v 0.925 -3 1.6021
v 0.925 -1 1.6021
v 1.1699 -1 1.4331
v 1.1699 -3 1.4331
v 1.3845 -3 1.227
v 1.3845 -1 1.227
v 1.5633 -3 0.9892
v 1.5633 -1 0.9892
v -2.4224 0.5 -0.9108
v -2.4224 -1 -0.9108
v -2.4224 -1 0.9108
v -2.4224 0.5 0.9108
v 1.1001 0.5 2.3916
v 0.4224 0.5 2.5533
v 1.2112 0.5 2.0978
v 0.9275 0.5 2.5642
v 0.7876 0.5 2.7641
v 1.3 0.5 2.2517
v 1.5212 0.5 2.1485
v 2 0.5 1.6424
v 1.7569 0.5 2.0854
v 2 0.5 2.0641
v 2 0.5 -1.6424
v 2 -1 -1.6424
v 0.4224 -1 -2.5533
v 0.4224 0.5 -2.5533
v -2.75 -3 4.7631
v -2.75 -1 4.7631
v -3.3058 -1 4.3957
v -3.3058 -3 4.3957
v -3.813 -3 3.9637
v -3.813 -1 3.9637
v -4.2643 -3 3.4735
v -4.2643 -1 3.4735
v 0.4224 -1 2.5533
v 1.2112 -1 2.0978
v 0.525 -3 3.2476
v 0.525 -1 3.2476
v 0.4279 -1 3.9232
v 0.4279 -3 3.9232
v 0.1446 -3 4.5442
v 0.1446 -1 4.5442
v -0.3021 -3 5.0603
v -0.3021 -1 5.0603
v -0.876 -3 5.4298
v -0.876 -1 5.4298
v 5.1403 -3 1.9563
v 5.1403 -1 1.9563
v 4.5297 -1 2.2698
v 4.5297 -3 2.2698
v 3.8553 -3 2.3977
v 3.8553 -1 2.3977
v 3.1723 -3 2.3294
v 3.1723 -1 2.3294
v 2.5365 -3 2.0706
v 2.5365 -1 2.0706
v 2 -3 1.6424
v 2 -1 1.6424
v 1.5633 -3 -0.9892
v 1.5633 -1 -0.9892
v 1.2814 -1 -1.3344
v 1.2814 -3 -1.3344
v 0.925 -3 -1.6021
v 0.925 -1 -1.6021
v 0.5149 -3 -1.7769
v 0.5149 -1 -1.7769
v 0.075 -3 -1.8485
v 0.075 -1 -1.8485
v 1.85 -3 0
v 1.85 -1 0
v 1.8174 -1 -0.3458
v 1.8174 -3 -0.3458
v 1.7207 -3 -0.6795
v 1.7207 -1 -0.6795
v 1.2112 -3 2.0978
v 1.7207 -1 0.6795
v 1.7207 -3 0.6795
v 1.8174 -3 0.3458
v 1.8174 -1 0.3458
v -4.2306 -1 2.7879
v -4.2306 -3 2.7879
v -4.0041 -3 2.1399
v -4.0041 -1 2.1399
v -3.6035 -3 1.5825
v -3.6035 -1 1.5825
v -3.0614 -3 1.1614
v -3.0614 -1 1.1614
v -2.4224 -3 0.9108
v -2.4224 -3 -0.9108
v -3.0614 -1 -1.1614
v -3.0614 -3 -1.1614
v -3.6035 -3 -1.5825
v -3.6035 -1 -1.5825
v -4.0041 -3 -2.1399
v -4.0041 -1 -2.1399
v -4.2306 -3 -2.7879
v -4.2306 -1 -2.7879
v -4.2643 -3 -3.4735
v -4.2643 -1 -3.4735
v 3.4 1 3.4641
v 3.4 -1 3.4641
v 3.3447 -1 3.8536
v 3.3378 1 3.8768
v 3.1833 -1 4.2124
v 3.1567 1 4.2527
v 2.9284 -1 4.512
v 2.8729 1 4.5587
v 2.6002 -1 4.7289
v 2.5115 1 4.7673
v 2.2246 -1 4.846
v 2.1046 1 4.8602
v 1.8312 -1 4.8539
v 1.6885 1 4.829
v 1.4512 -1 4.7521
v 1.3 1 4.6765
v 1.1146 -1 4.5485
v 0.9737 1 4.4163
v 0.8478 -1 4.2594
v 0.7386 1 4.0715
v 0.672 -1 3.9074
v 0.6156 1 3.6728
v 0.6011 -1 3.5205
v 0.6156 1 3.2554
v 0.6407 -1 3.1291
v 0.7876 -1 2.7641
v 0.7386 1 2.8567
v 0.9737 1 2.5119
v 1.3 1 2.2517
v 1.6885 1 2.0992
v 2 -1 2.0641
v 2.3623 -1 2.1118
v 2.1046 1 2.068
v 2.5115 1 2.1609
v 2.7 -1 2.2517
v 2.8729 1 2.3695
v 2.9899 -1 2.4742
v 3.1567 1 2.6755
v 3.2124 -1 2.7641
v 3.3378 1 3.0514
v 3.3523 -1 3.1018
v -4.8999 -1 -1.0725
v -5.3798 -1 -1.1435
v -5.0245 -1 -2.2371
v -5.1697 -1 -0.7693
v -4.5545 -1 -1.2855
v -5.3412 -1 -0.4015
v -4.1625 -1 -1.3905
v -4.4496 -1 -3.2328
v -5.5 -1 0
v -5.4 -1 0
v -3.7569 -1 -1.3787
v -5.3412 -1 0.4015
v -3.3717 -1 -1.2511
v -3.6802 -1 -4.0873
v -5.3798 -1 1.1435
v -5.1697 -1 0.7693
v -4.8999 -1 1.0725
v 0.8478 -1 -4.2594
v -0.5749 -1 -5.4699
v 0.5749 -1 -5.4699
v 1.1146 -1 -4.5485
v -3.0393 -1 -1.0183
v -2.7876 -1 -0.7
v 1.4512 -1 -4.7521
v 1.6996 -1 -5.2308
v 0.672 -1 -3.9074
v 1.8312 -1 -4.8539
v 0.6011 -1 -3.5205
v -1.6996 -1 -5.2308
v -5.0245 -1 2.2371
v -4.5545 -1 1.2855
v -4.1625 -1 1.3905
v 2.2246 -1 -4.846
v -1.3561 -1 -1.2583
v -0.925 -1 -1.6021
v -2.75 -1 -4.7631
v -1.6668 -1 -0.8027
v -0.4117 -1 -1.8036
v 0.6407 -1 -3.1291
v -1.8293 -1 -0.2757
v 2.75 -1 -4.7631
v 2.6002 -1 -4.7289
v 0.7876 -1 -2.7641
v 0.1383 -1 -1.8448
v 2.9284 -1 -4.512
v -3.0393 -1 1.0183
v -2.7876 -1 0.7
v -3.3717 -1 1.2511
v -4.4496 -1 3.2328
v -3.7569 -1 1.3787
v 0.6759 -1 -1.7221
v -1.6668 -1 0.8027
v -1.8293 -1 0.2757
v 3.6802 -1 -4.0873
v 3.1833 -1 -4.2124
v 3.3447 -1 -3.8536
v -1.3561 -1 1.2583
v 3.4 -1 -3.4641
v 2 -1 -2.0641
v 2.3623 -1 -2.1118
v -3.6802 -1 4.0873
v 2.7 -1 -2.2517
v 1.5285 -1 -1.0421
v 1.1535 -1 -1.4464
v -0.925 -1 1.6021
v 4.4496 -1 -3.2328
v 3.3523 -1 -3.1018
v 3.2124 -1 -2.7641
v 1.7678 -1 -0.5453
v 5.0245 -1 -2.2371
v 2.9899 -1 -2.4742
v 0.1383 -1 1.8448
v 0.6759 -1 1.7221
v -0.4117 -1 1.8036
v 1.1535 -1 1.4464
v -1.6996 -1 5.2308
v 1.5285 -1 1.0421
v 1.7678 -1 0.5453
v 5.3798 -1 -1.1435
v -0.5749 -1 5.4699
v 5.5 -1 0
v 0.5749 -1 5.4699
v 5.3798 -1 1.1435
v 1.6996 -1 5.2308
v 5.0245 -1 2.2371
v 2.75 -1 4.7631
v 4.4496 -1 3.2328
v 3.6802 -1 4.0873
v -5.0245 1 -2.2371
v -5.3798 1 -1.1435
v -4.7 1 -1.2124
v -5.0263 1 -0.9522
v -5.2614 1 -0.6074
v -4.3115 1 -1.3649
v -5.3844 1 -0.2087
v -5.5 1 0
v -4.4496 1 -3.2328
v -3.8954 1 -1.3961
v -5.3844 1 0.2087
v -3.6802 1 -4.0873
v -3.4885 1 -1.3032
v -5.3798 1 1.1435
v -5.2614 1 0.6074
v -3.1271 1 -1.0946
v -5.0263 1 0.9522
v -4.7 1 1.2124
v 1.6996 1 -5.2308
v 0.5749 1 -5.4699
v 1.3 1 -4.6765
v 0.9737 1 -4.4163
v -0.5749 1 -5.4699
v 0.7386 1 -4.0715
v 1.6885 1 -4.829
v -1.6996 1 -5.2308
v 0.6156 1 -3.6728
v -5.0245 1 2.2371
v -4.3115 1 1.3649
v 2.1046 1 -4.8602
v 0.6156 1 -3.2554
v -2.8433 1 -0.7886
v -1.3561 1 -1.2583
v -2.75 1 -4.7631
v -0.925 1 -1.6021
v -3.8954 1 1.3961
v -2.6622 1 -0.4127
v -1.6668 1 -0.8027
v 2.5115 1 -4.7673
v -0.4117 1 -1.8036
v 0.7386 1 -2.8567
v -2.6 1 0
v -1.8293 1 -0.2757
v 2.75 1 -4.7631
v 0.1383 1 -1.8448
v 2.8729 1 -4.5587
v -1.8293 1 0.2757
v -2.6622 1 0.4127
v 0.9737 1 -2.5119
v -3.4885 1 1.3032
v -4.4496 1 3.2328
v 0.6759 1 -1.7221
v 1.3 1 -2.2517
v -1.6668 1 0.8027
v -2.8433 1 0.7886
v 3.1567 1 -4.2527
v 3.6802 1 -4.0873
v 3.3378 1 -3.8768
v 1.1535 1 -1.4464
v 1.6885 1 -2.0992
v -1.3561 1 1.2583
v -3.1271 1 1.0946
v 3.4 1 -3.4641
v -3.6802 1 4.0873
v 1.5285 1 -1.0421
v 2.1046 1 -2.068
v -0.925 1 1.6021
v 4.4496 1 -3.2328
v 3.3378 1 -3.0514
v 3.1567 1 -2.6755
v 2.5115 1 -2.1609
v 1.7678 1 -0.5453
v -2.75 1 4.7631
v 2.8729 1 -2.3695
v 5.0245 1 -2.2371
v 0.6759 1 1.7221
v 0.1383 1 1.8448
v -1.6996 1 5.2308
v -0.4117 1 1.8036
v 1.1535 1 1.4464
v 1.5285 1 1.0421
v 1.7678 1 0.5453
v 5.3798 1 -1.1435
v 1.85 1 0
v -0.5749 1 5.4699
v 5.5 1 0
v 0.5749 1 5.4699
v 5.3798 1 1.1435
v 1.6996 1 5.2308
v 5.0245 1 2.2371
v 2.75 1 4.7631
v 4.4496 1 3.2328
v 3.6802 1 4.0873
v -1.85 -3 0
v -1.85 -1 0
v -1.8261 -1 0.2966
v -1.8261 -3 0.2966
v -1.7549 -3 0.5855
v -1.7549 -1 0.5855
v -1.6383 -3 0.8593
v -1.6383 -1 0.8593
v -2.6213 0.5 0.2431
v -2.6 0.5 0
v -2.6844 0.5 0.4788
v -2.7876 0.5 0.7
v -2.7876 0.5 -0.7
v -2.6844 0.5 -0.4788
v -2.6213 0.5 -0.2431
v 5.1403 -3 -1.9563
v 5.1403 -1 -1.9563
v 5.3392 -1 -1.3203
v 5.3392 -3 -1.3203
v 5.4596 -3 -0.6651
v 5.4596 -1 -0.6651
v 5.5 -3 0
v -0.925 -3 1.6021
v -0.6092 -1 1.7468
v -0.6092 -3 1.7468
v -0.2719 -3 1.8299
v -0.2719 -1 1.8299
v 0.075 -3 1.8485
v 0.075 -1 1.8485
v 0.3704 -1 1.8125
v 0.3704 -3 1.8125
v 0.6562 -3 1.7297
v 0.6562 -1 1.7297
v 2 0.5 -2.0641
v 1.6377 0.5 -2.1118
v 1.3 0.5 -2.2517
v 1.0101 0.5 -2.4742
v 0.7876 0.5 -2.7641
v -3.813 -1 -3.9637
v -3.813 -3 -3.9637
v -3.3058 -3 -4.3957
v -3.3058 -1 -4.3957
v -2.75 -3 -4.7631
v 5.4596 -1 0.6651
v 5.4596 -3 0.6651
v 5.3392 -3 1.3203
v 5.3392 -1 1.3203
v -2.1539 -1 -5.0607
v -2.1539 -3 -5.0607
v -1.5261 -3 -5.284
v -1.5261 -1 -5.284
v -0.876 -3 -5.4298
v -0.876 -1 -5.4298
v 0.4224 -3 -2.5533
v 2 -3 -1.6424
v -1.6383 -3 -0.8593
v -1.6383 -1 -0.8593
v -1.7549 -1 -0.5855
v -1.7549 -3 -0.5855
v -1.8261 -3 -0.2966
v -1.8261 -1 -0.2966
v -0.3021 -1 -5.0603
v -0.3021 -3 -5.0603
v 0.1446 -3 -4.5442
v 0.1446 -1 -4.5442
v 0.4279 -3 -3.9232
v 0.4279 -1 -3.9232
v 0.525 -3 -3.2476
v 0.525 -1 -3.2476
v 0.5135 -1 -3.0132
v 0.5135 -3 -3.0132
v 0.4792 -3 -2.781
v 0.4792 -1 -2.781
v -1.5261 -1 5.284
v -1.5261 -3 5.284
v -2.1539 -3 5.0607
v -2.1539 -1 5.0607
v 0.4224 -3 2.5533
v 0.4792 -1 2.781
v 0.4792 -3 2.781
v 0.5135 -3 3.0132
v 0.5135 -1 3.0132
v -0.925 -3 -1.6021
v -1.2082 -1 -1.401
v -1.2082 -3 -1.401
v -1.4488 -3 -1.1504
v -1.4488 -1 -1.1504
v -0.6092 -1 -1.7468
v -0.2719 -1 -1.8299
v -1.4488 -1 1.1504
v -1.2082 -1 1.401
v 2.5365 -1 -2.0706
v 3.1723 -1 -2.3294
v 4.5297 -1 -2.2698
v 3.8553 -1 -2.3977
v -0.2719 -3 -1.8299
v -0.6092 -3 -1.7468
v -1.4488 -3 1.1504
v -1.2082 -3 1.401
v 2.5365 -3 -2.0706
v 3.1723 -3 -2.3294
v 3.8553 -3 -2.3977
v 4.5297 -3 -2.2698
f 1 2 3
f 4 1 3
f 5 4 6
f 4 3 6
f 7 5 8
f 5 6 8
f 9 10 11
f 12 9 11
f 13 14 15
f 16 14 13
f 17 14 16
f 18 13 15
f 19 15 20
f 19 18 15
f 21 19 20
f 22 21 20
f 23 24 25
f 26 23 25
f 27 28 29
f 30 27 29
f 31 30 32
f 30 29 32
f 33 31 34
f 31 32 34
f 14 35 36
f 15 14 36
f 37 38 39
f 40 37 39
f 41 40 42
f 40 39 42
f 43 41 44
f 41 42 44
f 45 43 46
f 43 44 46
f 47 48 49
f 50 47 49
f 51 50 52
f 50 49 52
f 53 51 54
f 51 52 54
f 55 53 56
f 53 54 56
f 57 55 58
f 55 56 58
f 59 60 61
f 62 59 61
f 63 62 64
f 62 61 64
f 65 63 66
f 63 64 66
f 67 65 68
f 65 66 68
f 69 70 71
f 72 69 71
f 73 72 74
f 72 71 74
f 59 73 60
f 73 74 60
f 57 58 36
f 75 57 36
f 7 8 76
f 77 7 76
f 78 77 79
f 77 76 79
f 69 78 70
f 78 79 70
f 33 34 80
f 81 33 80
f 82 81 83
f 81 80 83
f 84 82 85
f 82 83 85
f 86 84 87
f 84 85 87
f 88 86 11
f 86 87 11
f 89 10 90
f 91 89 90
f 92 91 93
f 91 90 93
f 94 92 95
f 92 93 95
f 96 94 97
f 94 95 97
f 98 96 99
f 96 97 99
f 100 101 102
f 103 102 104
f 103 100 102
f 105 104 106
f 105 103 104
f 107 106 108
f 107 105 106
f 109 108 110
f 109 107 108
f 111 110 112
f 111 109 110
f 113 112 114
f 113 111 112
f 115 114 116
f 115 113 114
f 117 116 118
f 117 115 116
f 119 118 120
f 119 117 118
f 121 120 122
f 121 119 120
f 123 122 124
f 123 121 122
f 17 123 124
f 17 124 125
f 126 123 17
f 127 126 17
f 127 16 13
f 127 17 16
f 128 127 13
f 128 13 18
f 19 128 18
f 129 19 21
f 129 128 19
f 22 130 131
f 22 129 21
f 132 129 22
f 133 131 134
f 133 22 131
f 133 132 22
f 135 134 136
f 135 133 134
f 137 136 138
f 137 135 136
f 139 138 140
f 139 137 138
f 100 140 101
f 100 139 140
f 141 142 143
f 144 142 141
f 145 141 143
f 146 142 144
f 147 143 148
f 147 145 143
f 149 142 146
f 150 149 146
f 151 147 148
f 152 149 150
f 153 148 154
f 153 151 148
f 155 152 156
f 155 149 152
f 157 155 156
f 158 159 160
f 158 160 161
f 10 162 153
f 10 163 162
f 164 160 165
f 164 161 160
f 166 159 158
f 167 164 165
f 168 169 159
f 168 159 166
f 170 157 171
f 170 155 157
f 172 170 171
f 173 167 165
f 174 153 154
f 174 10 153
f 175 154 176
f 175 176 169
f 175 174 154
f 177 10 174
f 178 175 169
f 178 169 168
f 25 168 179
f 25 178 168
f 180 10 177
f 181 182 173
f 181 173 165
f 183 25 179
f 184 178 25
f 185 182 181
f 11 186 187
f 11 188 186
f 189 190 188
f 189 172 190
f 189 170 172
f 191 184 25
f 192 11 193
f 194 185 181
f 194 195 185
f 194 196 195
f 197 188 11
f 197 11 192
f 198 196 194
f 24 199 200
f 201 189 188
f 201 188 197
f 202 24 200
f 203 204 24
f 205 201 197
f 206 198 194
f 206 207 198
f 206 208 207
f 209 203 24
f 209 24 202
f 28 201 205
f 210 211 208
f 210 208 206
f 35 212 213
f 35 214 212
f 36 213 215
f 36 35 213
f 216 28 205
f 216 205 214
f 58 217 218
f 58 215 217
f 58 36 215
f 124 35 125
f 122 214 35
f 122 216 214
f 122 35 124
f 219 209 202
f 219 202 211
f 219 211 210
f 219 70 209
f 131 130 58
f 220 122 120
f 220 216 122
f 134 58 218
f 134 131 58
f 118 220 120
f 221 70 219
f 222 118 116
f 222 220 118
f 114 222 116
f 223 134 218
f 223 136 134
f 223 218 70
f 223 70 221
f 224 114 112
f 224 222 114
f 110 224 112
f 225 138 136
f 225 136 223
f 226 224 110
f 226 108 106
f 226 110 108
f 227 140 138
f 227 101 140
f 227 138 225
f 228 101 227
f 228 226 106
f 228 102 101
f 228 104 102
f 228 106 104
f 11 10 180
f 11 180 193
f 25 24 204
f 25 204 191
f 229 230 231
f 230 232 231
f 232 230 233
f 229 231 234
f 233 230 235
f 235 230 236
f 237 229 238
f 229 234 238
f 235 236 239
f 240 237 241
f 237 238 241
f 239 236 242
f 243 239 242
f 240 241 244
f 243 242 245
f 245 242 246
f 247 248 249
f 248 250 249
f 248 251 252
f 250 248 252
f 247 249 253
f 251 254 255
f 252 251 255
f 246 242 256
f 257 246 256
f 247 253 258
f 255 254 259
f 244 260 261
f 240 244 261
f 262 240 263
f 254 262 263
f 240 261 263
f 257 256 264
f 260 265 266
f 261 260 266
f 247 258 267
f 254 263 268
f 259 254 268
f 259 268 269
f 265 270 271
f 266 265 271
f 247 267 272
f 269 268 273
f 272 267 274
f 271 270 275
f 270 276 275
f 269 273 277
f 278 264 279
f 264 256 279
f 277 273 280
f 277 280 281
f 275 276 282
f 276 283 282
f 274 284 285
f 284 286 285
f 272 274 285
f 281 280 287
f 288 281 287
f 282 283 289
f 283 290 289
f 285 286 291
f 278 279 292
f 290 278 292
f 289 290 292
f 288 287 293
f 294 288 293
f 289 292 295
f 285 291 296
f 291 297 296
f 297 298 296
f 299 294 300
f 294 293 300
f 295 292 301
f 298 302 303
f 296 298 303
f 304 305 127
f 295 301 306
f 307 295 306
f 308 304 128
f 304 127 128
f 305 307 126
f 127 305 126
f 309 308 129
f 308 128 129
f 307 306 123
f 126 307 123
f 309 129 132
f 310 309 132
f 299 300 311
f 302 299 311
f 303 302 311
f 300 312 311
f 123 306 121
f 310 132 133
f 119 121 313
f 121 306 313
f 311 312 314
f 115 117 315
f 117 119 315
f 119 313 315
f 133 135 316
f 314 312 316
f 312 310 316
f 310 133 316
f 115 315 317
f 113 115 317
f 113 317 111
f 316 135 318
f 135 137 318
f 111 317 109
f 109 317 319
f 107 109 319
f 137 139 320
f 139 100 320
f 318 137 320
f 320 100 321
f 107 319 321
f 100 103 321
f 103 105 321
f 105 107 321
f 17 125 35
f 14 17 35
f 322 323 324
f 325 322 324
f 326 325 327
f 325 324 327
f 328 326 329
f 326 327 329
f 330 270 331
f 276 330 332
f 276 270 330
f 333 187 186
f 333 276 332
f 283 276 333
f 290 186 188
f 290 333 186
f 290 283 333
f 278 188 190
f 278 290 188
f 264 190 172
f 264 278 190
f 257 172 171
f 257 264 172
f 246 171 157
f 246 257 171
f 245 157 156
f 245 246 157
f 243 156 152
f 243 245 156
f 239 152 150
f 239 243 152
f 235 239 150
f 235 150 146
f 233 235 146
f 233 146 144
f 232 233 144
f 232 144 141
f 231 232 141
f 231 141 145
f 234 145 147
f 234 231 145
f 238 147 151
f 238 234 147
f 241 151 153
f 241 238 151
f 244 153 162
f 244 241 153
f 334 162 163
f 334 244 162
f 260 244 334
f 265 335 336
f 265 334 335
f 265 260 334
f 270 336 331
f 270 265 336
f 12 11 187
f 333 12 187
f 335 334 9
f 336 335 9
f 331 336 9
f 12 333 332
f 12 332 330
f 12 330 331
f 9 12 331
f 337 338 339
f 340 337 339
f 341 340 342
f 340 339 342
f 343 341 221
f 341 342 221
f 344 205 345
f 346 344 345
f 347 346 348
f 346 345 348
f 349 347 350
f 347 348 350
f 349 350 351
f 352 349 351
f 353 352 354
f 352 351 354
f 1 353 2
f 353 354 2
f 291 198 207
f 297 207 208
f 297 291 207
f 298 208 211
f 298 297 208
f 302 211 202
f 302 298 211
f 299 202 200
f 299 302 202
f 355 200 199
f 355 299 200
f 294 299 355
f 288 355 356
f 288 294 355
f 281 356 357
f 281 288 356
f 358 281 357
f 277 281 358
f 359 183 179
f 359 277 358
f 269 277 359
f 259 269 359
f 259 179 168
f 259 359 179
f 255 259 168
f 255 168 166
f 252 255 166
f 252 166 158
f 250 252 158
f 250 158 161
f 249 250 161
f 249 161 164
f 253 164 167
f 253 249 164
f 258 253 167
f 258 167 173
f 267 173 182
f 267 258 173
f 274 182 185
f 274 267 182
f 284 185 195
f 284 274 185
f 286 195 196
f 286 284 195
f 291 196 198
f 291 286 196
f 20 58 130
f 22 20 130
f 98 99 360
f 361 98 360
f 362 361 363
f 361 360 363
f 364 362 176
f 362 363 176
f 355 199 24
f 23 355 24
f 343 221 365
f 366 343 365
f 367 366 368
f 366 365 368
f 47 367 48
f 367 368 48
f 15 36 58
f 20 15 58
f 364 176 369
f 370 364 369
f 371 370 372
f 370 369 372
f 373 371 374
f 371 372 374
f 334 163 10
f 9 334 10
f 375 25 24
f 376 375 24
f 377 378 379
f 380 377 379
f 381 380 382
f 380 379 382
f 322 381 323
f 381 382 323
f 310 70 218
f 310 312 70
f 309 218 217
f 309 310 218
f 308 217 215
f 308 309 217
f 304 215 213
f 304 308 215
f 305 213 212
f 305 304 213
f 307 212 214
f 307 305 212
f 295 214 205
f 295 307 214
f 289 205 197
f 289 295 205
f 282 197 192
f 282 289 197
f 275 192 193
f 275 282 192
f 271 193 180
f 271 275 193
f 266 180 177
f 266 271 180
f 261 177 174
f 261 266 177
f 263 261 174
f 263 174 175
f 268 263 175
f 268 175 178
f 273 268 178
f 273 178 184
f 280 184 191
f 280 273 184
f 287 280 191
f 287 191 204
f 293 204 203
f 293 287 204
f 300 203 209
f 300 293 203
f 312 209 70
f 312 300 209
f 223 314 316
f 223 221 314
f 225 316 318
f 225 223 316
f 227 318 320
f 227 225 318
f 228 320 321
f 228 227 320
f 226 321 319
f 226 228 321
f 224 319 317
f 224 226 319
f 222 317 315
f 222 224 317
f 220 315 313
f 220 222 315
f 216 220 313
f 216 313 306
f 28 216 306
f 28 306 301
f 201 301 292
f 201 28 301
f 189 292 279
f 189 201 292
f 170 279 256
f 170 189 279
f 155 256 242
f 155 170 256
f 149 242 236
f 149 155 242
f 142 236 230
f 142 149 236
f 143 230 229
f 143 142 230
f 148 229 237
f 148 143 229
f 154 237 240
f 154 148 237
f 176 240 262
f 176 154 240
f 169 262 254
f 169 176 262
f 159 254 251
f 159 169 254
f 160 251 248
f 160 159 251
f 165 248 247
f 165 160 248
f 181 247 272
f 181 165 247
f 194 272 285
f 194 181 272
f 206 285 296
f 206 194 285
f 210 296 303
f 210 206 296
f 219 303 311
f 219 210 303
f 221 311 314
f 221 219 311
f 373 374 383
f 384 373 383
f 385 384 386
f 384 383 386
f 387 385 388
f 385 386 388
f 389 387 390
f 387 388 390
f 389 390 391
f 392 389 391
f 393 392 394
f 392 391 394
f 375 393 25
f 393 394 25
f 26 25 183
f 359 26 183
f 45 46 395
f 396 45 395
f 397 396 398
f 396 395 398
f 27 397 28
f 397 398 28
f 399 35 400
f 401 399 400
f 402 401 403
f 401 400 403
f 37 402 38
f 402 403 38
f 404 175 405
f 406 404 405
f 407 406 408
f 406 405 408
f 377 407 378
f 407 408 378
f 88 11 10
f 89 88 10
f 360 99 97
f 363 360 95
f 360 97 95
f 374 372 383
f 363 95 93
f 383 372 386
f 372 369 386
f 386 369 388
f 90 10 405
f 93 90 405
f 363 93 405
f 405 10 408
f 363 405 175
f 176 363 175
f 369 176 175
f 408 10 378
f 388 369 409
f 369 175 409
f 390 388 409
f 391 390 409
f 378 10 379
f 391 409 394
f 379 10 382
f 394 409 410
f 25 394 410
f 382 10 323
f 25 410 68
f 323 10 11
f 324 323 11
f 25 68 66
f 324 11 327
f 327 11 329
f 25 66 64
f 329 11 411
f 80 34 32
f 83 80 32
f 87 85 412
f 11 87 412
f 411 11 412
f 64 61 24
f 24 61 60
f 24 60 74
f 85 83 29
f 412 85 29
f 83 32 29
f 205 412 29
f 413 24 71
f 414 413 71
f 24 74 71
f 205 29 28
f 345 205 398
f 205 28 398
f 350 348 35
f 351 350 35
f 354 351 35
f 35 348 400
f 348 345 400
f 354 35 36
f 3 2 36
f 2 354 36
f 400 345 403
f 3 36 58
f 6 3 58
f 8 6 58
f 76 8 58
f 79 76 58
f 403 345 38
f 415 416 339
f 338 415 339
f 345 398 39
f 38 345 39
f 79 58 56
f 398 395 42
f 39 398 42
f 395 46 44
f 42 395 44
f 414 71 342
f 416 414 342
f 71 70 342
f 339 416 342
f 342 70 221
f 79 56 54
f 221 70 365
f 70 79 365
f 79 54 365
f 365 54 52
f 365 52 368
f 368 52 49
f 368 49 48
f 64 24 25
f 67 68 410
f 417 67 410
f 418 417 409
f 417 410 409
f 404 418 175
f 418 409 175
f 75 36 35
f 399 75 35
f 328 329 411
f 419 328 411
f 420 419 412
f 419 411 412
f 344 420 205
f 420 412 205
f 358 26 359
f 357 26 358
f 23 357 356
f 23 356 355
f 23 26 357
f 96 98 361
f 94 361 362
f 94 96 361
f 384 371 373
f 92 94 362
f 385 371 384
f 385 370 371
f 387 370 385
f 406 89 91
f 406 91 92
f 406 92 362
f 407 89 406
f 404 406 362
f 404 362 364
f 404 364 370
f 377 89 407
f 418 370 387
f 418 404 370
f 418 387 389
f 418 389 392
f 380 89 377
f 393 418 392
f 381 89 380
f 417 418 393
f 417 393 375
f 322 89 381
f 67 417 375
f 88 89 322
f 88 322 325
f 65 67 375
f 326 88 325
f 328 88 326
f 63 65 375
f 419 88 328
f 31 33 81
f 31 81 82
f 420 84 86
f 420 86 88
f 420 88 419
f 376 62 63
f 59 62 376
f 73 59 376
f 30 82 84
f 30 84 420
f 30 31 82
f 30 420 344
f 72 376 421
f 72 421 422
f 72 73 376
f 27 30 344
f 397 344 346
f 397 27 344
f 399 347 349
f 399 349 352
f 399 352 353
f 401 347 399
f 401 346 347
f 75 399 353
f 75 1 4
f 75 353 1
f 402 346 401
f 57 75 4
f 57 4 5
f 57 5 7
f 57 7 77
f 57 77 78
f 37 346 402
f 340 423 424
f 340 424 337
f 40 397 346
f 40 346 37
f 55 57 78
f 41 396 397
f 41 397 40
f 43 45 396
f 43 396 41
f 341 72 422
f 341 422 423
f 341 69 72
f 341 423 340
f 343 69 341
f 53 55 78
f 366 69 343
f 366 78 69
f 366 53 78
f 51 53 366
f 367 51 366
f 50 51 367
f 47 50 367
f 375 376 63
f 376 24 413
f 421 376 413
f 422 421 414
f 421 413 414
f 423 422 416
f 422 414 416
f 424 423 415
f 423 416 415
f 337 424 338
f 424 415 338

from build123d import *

# Parameters (mm, degrees)
F0_R     = 5.5
F0_R_2   = 1.4
F0_R_3   = 1.85
F1_DEPTH = 1
F3_DEPTH = 2
F4_DEPTH = 1.5


with BuildPart() as f1:
    # F0 (on Front) → F1 (new body, symmetric)
    with BuildSketch(Plane.XZ):
        Circle(F0_R)
        with Locations((2, -3.4641016151)):
            Circle(F0_R_2, mode=Mode.SUBTRACT)
        with Locations((-4, 0)):
            Circle(F0_R_2, mode=Mode.SUBTRACT)
        Circle(F0_R_3, mode=Mode.SUBTRACT)
        with Locations((2, 3.4641016151)):
            Circle(F0_R_2, mode=Mode.SUBTRACT)
    extrude(amount=F1_DEPTH, both=True)

    # F2 (on face) → F4 (cut)
    with BuildSketch(Plane.XZ.offset(1)):
        with BuildLine():
            Line((1.2111829933, 2.0978304817), (1.3, 2.2516660498))
            ThreePointArc((1.3, 2.2516660498), (1.0100505063, 2.4741521215), (0.7875644347, 2.7641016151))
            Line((0.7875644347, 2.7641016151), (0.4223659867, 2.5532541929))
            Line((0.4223659867, 2.5532541929), (1.2111829933, 2.0978304817))
        make_face()
        with BuildLine():
            ThreePointArc((2, 2.0641016151), (1.6376533369, 2.1118054583), (1.3, 2.2516660498))
            Line((1.3, 2.2516660498), (1.2111829933, 2.0978304817))
            Line((1.2111829933, 2.0978304817), (2, 1.6424067706))
            Line((2, 1.6424067706), (2, 2.0641016151))
        make_face()
        with BuildLine():
            Line((2, -2.0641016151), (2, -1.6424067706))
            Line((2, -1.6424067706), (0.4223659867, -2.5532541929))
            Line((0.4223659867, -2.5532541929), (0.7875644347, -2.7641016151))
            ThreePointArc((0.7875644347, -2.7641016151), (1.3, -2.2516660498), (2, -2.0641016151))
        make_face()
        with BuildLine():
            Line((-2.4223659867, -0.9108474223), (-2.4223659867, 0))
            Line((-2.4223659867, 0), (-2.6, 0))
            ThreePointArc((-2.6, 0), (-2.6477038432, -0.3623466631), (-2.7875644347, -0.7))
            Line((-2.7875644347, -0.7), (-2.4223659867, -0.9108474223))
        make_face()
        with BuildLine():
            Line((-2.4223659867, 0), (-2.4223659867, 0.9108474223))
            Line((-2.4223659867, 0.9108474223), (-2.7875644347, 0.7))
            ThreePointArc((-2.7875644347, 0.7), (-2.6477038432, 0.3623466631), (-2.6, 0))
            Line((-2.6, 0), (-2.4223659867, 0))
        make_face()
    extrude(amount=-F4_DEPTH, mode=Mode.SUBTRACT)


with BuildPart() as f3:
    # F2 (on face) → F3 (new body)
    with BuildSketch(Plane.XZ.offset(1)):
        with BuildLine():
            Line((-1, 1.7320508076), (0.4223659867, 2.5532541929))
            ThreePointArc((0.4223659867, 2.5532541929), (0.4992028523, 2.896652511), (0.525, 3.2475952642))
            ThreePointArc((0.525, 3.2475952642), (0.1446064838, 4.5442022404), (-0.8759913757, 5.4297918109))
            ThreePointArc((-0.8759913757, 5.4297918109), (-1.843382656, 5.1818857941), (-2.75, 4.7631397208))
            Line((-2.75, 4.7631397208), (-1, 1.7320508076))
        make_face()
        with BuildLine():
            Line((-2.4223659867, 0.9108474223), (-1, 1.7320508076))
            Line((-1, 1.7320508076), (-2.75, 4.7631397208))
            ThreePointArc((-2.75, 4.7631397208), (-3.5659534093, 4.1873591061), (-4.2643419577, 3.4735266903))
            ThreePointArc((-4.2643419577, 3.4735266903), (-3.823818782, 1.8468435536), (-2.4223659867, 0.9108474223))
        make_face()
        with BuildLine():
            ThreePointArc((5.1403333333, 1.9562651206), (3.5113228252, 2.3881024279), (2, 1.6424067706))
            Line((2, 1.6424067706), (2, 0))
            Line((2, 0), (5.5, 0))
            ThreePointArc((5.5, 0), (5.4093360652, 0.9945266881), (5.1403333333, 1.9562651206))
        make_face()
        with BuildLine():
            Line((5.5, 0), (2, 0))
            Line((2, 0), (2, -1.6424067706))
            ThreePointArc((2, -1.6424067706), (3.5113228252, -2.3881024279), (5.1403333333, -1.9562651206))
            ThreePointArc((5.1403333333, -1.9562651206), (5.4093360652, -0.9945266881), (5.5, 0))
        make_face()
        with BuildLine():
            ThreePointArc((0.525, -3.2475952642), (0.4992028523, -2.896652511), (0.4223659867, -2.5532541929))
            Line((0.4223659867, -2.5532541929), (-1, -1.7320508076))
            Line((-1, -1.7320508076), (-2.75, -4.7631397208))
            ThreePointArc((-2.75, -4.7631397208), (-1.843382656, -5.1818857941), (-0.8759913757, -5.4297918109))
            ThreePointArc((-0.8759913757, -5.4297918109), (0.1446064838, -4.5442022404), (0.525, -3.2475952642))
        make_face()
        with BuildLine():
            Line((-2.75, -4.7631397208), (-1, -1.7320508076))
            Line((-1, -1.7320508076), (-2.4223659867, -0.9108474223))
            ThreePointArc((-2.4223659867, -0.9108474223), (-3.823818782, -1.8468435536), (-4.2643419577, -3.4735266903))
            ThreePointArc((-4.2643419577, -3.4735266903), (-3.5659534093, -4.1873591061), (-2.75, -4.7631397208))
        make_face()
        with BuildLine():
            Line((0.925, 1.602146997), (1.2111829933, 2.0978304817))
            Line((1.2111829933, 2.0978304817), (0.4223659867, 2.5532541929))
            ThreePointArc((0.4223659867, 2.5532541929), (0.2777174855, 2.1865545357), (0.0749935149, 1.8484793677))
            ThreePointArc((0.0749935149, 1.8484793677), (0.5149433626, 1.7768886666), (0.925, 1.602146997))
        make_face()
        with BuildLine():
            Line((2, 1.6424067706), (1.2111829933, 2.0978304817))
            Line((1.2111829933, 2.0978304817), (0.925, 1.602146997))
            ThreePointArc((0.925, 1.602146997), (1.2813590436, 1.3343983668), (1.5633333333, 0.9891859729))
            ThreePointArc((1.5633333333, 0.9891859729), (1.7547530319, 1.3337876654), (2, 1.6424067706))
        make_face()
        with BuildLine():
            Line((0.4223659867, -2.5532541929), (2, -1.6424067706))
            ThreePointArc((2, -1.6424067706), (1.7547530319, -1.3337876654), (1.5633333333, -0.9891859729))
            ThreePointArc((1.5633333333, -0.9891859729), (0.925, -1.602146997), (0.0749935149, -1.8484793677))
            ThreePointArc((0.0749935149, -1.8484793677), (0.2777174855, -2.1865545357), (0.4223659867, -2.5532541929))
        make_face()
        with BuildLine():
            ThreePointArc((-1.6383268482, 0.8592933948), (-2.0324705174, 0.8527668703), (-2.4223659867, 0.9108474223))
            Line((-2.4223659867, 0.9108474223), (-2.4223659867, 0))
            Line((-2.4223659867, 0), (-1.85, 0))
            ThreePointArc((-1.85, 0), (-1.7963024062, 0.4424902998), (-1.6383268482, 0.8592933948))
        make_face()
        with BuildLine():
            ThreePointArc((-1.6383268482, -0.8592933948), (-1.7963024062, -0.4424902998), (-1.85, 0))
            Line((-1.85, 0), (-2.4223659867, 0))
            Line((-2.4223659867, 0), (-2.4223659867, -0.9108474223))
            ThreePointArc((-2.4223659867, -0.9108474223), (-2.0324705174, -0.8527668703), (-1.6383268482, -0.8592933948))
        make_face()
        with BuildLine():
            ThreePointArc((0.0749935149, 1.8484793677), (0.2777174855, 2.1865545357), (0.4223659867, 2.5532541929))
            Line((0.4223659867, 2.5532541929), (-1, 1.7320508076))
            Line((-1, 1.7320508076), (-0.925, 1.602146997))
            ThreePointArc((-0.925, 1.602146997), (-0.4424902998, 1.7963024062), (0.0749935149, 1.8484793677))
        make_face()
        with BuildLine():
            Line((-0.925, 1.602146997), (-1, 1.7320508076))
            Line((-1, 1.7320508076), (-2.4223659867, 0.9108474223))
            ThreePointArc((-2.4223659867, 0.9108474223), (-2.0324705174, 0.8527668703), (-1.6383268482, 0.8592933948))
            ThreePointArc((-1.6383268482, 0.8592933948), (-1.3343983668, 1.2813590436), (-0.925, 1.602146997))
        make_face()
        with BuildLine():
            ThreePointArc((-0.925, -1.602146997), (-1.3343983668, -1.2813590436), (-1.6383268482, -0.8592933948))
            ThreePointArc((-1.6383268482, -0.8592933948), (-2.0324705174, -0.8527668703), (-2.4223659867, -0.9108474223))
            Line((-2.4223659867, -0.9108474223), (-1, -1.7320508076))
            Line((-1, -1.7320508076), (-0.925, -1.602146997))
        make_face()
        with BuildLine():
            Line((-1, -1.7320508076), (0.4223659867, -2.5532541929))
            ThreePointArc((0.4223659867, -2.5532541929), (0.2777174855, -2.1865545357), (0.0749935149, -1.8484793677))
            ThreePointArc((0.0749935149, -1.8484793677), (-0.4424902998, -1.7963024062), (-0.925, -1.602146997))
            Line((-0.925, -1.602146997), (-1, -1.7320508076))
        make_face()
        with BuildLine():
            Line((2, -1.6424067706), (2, 0))
            Line((2, 0), (1.85, 0))
            ThreePointArc((1.85, 0), (1.7768886666, -0.5149433626), (1.5633333333, -0.9891859729))
            ThreePointArc((1.5633333333, -0.9891859729), (1.7547530319, -1.3337876654), (2, -1.6424067706))
        make_face()
        with BuildLine():
            Line((2, 0), (2, 1.6424067706))
            ThreePointArc((2, 1.6424067706), (1.7547530319, 1.3337876654), (1.5633333333, 0.9891859729))
            ThreePointArc((1.5633333333, 0.9891859729), (1.7768886666, 0.5149433626), (1.85, 0))
            Line((1.85, 0), (2, 0))
        make_face()
    extrude(amount=F3_DEPTH)


solid = Compound([f1.part, f3.part])
